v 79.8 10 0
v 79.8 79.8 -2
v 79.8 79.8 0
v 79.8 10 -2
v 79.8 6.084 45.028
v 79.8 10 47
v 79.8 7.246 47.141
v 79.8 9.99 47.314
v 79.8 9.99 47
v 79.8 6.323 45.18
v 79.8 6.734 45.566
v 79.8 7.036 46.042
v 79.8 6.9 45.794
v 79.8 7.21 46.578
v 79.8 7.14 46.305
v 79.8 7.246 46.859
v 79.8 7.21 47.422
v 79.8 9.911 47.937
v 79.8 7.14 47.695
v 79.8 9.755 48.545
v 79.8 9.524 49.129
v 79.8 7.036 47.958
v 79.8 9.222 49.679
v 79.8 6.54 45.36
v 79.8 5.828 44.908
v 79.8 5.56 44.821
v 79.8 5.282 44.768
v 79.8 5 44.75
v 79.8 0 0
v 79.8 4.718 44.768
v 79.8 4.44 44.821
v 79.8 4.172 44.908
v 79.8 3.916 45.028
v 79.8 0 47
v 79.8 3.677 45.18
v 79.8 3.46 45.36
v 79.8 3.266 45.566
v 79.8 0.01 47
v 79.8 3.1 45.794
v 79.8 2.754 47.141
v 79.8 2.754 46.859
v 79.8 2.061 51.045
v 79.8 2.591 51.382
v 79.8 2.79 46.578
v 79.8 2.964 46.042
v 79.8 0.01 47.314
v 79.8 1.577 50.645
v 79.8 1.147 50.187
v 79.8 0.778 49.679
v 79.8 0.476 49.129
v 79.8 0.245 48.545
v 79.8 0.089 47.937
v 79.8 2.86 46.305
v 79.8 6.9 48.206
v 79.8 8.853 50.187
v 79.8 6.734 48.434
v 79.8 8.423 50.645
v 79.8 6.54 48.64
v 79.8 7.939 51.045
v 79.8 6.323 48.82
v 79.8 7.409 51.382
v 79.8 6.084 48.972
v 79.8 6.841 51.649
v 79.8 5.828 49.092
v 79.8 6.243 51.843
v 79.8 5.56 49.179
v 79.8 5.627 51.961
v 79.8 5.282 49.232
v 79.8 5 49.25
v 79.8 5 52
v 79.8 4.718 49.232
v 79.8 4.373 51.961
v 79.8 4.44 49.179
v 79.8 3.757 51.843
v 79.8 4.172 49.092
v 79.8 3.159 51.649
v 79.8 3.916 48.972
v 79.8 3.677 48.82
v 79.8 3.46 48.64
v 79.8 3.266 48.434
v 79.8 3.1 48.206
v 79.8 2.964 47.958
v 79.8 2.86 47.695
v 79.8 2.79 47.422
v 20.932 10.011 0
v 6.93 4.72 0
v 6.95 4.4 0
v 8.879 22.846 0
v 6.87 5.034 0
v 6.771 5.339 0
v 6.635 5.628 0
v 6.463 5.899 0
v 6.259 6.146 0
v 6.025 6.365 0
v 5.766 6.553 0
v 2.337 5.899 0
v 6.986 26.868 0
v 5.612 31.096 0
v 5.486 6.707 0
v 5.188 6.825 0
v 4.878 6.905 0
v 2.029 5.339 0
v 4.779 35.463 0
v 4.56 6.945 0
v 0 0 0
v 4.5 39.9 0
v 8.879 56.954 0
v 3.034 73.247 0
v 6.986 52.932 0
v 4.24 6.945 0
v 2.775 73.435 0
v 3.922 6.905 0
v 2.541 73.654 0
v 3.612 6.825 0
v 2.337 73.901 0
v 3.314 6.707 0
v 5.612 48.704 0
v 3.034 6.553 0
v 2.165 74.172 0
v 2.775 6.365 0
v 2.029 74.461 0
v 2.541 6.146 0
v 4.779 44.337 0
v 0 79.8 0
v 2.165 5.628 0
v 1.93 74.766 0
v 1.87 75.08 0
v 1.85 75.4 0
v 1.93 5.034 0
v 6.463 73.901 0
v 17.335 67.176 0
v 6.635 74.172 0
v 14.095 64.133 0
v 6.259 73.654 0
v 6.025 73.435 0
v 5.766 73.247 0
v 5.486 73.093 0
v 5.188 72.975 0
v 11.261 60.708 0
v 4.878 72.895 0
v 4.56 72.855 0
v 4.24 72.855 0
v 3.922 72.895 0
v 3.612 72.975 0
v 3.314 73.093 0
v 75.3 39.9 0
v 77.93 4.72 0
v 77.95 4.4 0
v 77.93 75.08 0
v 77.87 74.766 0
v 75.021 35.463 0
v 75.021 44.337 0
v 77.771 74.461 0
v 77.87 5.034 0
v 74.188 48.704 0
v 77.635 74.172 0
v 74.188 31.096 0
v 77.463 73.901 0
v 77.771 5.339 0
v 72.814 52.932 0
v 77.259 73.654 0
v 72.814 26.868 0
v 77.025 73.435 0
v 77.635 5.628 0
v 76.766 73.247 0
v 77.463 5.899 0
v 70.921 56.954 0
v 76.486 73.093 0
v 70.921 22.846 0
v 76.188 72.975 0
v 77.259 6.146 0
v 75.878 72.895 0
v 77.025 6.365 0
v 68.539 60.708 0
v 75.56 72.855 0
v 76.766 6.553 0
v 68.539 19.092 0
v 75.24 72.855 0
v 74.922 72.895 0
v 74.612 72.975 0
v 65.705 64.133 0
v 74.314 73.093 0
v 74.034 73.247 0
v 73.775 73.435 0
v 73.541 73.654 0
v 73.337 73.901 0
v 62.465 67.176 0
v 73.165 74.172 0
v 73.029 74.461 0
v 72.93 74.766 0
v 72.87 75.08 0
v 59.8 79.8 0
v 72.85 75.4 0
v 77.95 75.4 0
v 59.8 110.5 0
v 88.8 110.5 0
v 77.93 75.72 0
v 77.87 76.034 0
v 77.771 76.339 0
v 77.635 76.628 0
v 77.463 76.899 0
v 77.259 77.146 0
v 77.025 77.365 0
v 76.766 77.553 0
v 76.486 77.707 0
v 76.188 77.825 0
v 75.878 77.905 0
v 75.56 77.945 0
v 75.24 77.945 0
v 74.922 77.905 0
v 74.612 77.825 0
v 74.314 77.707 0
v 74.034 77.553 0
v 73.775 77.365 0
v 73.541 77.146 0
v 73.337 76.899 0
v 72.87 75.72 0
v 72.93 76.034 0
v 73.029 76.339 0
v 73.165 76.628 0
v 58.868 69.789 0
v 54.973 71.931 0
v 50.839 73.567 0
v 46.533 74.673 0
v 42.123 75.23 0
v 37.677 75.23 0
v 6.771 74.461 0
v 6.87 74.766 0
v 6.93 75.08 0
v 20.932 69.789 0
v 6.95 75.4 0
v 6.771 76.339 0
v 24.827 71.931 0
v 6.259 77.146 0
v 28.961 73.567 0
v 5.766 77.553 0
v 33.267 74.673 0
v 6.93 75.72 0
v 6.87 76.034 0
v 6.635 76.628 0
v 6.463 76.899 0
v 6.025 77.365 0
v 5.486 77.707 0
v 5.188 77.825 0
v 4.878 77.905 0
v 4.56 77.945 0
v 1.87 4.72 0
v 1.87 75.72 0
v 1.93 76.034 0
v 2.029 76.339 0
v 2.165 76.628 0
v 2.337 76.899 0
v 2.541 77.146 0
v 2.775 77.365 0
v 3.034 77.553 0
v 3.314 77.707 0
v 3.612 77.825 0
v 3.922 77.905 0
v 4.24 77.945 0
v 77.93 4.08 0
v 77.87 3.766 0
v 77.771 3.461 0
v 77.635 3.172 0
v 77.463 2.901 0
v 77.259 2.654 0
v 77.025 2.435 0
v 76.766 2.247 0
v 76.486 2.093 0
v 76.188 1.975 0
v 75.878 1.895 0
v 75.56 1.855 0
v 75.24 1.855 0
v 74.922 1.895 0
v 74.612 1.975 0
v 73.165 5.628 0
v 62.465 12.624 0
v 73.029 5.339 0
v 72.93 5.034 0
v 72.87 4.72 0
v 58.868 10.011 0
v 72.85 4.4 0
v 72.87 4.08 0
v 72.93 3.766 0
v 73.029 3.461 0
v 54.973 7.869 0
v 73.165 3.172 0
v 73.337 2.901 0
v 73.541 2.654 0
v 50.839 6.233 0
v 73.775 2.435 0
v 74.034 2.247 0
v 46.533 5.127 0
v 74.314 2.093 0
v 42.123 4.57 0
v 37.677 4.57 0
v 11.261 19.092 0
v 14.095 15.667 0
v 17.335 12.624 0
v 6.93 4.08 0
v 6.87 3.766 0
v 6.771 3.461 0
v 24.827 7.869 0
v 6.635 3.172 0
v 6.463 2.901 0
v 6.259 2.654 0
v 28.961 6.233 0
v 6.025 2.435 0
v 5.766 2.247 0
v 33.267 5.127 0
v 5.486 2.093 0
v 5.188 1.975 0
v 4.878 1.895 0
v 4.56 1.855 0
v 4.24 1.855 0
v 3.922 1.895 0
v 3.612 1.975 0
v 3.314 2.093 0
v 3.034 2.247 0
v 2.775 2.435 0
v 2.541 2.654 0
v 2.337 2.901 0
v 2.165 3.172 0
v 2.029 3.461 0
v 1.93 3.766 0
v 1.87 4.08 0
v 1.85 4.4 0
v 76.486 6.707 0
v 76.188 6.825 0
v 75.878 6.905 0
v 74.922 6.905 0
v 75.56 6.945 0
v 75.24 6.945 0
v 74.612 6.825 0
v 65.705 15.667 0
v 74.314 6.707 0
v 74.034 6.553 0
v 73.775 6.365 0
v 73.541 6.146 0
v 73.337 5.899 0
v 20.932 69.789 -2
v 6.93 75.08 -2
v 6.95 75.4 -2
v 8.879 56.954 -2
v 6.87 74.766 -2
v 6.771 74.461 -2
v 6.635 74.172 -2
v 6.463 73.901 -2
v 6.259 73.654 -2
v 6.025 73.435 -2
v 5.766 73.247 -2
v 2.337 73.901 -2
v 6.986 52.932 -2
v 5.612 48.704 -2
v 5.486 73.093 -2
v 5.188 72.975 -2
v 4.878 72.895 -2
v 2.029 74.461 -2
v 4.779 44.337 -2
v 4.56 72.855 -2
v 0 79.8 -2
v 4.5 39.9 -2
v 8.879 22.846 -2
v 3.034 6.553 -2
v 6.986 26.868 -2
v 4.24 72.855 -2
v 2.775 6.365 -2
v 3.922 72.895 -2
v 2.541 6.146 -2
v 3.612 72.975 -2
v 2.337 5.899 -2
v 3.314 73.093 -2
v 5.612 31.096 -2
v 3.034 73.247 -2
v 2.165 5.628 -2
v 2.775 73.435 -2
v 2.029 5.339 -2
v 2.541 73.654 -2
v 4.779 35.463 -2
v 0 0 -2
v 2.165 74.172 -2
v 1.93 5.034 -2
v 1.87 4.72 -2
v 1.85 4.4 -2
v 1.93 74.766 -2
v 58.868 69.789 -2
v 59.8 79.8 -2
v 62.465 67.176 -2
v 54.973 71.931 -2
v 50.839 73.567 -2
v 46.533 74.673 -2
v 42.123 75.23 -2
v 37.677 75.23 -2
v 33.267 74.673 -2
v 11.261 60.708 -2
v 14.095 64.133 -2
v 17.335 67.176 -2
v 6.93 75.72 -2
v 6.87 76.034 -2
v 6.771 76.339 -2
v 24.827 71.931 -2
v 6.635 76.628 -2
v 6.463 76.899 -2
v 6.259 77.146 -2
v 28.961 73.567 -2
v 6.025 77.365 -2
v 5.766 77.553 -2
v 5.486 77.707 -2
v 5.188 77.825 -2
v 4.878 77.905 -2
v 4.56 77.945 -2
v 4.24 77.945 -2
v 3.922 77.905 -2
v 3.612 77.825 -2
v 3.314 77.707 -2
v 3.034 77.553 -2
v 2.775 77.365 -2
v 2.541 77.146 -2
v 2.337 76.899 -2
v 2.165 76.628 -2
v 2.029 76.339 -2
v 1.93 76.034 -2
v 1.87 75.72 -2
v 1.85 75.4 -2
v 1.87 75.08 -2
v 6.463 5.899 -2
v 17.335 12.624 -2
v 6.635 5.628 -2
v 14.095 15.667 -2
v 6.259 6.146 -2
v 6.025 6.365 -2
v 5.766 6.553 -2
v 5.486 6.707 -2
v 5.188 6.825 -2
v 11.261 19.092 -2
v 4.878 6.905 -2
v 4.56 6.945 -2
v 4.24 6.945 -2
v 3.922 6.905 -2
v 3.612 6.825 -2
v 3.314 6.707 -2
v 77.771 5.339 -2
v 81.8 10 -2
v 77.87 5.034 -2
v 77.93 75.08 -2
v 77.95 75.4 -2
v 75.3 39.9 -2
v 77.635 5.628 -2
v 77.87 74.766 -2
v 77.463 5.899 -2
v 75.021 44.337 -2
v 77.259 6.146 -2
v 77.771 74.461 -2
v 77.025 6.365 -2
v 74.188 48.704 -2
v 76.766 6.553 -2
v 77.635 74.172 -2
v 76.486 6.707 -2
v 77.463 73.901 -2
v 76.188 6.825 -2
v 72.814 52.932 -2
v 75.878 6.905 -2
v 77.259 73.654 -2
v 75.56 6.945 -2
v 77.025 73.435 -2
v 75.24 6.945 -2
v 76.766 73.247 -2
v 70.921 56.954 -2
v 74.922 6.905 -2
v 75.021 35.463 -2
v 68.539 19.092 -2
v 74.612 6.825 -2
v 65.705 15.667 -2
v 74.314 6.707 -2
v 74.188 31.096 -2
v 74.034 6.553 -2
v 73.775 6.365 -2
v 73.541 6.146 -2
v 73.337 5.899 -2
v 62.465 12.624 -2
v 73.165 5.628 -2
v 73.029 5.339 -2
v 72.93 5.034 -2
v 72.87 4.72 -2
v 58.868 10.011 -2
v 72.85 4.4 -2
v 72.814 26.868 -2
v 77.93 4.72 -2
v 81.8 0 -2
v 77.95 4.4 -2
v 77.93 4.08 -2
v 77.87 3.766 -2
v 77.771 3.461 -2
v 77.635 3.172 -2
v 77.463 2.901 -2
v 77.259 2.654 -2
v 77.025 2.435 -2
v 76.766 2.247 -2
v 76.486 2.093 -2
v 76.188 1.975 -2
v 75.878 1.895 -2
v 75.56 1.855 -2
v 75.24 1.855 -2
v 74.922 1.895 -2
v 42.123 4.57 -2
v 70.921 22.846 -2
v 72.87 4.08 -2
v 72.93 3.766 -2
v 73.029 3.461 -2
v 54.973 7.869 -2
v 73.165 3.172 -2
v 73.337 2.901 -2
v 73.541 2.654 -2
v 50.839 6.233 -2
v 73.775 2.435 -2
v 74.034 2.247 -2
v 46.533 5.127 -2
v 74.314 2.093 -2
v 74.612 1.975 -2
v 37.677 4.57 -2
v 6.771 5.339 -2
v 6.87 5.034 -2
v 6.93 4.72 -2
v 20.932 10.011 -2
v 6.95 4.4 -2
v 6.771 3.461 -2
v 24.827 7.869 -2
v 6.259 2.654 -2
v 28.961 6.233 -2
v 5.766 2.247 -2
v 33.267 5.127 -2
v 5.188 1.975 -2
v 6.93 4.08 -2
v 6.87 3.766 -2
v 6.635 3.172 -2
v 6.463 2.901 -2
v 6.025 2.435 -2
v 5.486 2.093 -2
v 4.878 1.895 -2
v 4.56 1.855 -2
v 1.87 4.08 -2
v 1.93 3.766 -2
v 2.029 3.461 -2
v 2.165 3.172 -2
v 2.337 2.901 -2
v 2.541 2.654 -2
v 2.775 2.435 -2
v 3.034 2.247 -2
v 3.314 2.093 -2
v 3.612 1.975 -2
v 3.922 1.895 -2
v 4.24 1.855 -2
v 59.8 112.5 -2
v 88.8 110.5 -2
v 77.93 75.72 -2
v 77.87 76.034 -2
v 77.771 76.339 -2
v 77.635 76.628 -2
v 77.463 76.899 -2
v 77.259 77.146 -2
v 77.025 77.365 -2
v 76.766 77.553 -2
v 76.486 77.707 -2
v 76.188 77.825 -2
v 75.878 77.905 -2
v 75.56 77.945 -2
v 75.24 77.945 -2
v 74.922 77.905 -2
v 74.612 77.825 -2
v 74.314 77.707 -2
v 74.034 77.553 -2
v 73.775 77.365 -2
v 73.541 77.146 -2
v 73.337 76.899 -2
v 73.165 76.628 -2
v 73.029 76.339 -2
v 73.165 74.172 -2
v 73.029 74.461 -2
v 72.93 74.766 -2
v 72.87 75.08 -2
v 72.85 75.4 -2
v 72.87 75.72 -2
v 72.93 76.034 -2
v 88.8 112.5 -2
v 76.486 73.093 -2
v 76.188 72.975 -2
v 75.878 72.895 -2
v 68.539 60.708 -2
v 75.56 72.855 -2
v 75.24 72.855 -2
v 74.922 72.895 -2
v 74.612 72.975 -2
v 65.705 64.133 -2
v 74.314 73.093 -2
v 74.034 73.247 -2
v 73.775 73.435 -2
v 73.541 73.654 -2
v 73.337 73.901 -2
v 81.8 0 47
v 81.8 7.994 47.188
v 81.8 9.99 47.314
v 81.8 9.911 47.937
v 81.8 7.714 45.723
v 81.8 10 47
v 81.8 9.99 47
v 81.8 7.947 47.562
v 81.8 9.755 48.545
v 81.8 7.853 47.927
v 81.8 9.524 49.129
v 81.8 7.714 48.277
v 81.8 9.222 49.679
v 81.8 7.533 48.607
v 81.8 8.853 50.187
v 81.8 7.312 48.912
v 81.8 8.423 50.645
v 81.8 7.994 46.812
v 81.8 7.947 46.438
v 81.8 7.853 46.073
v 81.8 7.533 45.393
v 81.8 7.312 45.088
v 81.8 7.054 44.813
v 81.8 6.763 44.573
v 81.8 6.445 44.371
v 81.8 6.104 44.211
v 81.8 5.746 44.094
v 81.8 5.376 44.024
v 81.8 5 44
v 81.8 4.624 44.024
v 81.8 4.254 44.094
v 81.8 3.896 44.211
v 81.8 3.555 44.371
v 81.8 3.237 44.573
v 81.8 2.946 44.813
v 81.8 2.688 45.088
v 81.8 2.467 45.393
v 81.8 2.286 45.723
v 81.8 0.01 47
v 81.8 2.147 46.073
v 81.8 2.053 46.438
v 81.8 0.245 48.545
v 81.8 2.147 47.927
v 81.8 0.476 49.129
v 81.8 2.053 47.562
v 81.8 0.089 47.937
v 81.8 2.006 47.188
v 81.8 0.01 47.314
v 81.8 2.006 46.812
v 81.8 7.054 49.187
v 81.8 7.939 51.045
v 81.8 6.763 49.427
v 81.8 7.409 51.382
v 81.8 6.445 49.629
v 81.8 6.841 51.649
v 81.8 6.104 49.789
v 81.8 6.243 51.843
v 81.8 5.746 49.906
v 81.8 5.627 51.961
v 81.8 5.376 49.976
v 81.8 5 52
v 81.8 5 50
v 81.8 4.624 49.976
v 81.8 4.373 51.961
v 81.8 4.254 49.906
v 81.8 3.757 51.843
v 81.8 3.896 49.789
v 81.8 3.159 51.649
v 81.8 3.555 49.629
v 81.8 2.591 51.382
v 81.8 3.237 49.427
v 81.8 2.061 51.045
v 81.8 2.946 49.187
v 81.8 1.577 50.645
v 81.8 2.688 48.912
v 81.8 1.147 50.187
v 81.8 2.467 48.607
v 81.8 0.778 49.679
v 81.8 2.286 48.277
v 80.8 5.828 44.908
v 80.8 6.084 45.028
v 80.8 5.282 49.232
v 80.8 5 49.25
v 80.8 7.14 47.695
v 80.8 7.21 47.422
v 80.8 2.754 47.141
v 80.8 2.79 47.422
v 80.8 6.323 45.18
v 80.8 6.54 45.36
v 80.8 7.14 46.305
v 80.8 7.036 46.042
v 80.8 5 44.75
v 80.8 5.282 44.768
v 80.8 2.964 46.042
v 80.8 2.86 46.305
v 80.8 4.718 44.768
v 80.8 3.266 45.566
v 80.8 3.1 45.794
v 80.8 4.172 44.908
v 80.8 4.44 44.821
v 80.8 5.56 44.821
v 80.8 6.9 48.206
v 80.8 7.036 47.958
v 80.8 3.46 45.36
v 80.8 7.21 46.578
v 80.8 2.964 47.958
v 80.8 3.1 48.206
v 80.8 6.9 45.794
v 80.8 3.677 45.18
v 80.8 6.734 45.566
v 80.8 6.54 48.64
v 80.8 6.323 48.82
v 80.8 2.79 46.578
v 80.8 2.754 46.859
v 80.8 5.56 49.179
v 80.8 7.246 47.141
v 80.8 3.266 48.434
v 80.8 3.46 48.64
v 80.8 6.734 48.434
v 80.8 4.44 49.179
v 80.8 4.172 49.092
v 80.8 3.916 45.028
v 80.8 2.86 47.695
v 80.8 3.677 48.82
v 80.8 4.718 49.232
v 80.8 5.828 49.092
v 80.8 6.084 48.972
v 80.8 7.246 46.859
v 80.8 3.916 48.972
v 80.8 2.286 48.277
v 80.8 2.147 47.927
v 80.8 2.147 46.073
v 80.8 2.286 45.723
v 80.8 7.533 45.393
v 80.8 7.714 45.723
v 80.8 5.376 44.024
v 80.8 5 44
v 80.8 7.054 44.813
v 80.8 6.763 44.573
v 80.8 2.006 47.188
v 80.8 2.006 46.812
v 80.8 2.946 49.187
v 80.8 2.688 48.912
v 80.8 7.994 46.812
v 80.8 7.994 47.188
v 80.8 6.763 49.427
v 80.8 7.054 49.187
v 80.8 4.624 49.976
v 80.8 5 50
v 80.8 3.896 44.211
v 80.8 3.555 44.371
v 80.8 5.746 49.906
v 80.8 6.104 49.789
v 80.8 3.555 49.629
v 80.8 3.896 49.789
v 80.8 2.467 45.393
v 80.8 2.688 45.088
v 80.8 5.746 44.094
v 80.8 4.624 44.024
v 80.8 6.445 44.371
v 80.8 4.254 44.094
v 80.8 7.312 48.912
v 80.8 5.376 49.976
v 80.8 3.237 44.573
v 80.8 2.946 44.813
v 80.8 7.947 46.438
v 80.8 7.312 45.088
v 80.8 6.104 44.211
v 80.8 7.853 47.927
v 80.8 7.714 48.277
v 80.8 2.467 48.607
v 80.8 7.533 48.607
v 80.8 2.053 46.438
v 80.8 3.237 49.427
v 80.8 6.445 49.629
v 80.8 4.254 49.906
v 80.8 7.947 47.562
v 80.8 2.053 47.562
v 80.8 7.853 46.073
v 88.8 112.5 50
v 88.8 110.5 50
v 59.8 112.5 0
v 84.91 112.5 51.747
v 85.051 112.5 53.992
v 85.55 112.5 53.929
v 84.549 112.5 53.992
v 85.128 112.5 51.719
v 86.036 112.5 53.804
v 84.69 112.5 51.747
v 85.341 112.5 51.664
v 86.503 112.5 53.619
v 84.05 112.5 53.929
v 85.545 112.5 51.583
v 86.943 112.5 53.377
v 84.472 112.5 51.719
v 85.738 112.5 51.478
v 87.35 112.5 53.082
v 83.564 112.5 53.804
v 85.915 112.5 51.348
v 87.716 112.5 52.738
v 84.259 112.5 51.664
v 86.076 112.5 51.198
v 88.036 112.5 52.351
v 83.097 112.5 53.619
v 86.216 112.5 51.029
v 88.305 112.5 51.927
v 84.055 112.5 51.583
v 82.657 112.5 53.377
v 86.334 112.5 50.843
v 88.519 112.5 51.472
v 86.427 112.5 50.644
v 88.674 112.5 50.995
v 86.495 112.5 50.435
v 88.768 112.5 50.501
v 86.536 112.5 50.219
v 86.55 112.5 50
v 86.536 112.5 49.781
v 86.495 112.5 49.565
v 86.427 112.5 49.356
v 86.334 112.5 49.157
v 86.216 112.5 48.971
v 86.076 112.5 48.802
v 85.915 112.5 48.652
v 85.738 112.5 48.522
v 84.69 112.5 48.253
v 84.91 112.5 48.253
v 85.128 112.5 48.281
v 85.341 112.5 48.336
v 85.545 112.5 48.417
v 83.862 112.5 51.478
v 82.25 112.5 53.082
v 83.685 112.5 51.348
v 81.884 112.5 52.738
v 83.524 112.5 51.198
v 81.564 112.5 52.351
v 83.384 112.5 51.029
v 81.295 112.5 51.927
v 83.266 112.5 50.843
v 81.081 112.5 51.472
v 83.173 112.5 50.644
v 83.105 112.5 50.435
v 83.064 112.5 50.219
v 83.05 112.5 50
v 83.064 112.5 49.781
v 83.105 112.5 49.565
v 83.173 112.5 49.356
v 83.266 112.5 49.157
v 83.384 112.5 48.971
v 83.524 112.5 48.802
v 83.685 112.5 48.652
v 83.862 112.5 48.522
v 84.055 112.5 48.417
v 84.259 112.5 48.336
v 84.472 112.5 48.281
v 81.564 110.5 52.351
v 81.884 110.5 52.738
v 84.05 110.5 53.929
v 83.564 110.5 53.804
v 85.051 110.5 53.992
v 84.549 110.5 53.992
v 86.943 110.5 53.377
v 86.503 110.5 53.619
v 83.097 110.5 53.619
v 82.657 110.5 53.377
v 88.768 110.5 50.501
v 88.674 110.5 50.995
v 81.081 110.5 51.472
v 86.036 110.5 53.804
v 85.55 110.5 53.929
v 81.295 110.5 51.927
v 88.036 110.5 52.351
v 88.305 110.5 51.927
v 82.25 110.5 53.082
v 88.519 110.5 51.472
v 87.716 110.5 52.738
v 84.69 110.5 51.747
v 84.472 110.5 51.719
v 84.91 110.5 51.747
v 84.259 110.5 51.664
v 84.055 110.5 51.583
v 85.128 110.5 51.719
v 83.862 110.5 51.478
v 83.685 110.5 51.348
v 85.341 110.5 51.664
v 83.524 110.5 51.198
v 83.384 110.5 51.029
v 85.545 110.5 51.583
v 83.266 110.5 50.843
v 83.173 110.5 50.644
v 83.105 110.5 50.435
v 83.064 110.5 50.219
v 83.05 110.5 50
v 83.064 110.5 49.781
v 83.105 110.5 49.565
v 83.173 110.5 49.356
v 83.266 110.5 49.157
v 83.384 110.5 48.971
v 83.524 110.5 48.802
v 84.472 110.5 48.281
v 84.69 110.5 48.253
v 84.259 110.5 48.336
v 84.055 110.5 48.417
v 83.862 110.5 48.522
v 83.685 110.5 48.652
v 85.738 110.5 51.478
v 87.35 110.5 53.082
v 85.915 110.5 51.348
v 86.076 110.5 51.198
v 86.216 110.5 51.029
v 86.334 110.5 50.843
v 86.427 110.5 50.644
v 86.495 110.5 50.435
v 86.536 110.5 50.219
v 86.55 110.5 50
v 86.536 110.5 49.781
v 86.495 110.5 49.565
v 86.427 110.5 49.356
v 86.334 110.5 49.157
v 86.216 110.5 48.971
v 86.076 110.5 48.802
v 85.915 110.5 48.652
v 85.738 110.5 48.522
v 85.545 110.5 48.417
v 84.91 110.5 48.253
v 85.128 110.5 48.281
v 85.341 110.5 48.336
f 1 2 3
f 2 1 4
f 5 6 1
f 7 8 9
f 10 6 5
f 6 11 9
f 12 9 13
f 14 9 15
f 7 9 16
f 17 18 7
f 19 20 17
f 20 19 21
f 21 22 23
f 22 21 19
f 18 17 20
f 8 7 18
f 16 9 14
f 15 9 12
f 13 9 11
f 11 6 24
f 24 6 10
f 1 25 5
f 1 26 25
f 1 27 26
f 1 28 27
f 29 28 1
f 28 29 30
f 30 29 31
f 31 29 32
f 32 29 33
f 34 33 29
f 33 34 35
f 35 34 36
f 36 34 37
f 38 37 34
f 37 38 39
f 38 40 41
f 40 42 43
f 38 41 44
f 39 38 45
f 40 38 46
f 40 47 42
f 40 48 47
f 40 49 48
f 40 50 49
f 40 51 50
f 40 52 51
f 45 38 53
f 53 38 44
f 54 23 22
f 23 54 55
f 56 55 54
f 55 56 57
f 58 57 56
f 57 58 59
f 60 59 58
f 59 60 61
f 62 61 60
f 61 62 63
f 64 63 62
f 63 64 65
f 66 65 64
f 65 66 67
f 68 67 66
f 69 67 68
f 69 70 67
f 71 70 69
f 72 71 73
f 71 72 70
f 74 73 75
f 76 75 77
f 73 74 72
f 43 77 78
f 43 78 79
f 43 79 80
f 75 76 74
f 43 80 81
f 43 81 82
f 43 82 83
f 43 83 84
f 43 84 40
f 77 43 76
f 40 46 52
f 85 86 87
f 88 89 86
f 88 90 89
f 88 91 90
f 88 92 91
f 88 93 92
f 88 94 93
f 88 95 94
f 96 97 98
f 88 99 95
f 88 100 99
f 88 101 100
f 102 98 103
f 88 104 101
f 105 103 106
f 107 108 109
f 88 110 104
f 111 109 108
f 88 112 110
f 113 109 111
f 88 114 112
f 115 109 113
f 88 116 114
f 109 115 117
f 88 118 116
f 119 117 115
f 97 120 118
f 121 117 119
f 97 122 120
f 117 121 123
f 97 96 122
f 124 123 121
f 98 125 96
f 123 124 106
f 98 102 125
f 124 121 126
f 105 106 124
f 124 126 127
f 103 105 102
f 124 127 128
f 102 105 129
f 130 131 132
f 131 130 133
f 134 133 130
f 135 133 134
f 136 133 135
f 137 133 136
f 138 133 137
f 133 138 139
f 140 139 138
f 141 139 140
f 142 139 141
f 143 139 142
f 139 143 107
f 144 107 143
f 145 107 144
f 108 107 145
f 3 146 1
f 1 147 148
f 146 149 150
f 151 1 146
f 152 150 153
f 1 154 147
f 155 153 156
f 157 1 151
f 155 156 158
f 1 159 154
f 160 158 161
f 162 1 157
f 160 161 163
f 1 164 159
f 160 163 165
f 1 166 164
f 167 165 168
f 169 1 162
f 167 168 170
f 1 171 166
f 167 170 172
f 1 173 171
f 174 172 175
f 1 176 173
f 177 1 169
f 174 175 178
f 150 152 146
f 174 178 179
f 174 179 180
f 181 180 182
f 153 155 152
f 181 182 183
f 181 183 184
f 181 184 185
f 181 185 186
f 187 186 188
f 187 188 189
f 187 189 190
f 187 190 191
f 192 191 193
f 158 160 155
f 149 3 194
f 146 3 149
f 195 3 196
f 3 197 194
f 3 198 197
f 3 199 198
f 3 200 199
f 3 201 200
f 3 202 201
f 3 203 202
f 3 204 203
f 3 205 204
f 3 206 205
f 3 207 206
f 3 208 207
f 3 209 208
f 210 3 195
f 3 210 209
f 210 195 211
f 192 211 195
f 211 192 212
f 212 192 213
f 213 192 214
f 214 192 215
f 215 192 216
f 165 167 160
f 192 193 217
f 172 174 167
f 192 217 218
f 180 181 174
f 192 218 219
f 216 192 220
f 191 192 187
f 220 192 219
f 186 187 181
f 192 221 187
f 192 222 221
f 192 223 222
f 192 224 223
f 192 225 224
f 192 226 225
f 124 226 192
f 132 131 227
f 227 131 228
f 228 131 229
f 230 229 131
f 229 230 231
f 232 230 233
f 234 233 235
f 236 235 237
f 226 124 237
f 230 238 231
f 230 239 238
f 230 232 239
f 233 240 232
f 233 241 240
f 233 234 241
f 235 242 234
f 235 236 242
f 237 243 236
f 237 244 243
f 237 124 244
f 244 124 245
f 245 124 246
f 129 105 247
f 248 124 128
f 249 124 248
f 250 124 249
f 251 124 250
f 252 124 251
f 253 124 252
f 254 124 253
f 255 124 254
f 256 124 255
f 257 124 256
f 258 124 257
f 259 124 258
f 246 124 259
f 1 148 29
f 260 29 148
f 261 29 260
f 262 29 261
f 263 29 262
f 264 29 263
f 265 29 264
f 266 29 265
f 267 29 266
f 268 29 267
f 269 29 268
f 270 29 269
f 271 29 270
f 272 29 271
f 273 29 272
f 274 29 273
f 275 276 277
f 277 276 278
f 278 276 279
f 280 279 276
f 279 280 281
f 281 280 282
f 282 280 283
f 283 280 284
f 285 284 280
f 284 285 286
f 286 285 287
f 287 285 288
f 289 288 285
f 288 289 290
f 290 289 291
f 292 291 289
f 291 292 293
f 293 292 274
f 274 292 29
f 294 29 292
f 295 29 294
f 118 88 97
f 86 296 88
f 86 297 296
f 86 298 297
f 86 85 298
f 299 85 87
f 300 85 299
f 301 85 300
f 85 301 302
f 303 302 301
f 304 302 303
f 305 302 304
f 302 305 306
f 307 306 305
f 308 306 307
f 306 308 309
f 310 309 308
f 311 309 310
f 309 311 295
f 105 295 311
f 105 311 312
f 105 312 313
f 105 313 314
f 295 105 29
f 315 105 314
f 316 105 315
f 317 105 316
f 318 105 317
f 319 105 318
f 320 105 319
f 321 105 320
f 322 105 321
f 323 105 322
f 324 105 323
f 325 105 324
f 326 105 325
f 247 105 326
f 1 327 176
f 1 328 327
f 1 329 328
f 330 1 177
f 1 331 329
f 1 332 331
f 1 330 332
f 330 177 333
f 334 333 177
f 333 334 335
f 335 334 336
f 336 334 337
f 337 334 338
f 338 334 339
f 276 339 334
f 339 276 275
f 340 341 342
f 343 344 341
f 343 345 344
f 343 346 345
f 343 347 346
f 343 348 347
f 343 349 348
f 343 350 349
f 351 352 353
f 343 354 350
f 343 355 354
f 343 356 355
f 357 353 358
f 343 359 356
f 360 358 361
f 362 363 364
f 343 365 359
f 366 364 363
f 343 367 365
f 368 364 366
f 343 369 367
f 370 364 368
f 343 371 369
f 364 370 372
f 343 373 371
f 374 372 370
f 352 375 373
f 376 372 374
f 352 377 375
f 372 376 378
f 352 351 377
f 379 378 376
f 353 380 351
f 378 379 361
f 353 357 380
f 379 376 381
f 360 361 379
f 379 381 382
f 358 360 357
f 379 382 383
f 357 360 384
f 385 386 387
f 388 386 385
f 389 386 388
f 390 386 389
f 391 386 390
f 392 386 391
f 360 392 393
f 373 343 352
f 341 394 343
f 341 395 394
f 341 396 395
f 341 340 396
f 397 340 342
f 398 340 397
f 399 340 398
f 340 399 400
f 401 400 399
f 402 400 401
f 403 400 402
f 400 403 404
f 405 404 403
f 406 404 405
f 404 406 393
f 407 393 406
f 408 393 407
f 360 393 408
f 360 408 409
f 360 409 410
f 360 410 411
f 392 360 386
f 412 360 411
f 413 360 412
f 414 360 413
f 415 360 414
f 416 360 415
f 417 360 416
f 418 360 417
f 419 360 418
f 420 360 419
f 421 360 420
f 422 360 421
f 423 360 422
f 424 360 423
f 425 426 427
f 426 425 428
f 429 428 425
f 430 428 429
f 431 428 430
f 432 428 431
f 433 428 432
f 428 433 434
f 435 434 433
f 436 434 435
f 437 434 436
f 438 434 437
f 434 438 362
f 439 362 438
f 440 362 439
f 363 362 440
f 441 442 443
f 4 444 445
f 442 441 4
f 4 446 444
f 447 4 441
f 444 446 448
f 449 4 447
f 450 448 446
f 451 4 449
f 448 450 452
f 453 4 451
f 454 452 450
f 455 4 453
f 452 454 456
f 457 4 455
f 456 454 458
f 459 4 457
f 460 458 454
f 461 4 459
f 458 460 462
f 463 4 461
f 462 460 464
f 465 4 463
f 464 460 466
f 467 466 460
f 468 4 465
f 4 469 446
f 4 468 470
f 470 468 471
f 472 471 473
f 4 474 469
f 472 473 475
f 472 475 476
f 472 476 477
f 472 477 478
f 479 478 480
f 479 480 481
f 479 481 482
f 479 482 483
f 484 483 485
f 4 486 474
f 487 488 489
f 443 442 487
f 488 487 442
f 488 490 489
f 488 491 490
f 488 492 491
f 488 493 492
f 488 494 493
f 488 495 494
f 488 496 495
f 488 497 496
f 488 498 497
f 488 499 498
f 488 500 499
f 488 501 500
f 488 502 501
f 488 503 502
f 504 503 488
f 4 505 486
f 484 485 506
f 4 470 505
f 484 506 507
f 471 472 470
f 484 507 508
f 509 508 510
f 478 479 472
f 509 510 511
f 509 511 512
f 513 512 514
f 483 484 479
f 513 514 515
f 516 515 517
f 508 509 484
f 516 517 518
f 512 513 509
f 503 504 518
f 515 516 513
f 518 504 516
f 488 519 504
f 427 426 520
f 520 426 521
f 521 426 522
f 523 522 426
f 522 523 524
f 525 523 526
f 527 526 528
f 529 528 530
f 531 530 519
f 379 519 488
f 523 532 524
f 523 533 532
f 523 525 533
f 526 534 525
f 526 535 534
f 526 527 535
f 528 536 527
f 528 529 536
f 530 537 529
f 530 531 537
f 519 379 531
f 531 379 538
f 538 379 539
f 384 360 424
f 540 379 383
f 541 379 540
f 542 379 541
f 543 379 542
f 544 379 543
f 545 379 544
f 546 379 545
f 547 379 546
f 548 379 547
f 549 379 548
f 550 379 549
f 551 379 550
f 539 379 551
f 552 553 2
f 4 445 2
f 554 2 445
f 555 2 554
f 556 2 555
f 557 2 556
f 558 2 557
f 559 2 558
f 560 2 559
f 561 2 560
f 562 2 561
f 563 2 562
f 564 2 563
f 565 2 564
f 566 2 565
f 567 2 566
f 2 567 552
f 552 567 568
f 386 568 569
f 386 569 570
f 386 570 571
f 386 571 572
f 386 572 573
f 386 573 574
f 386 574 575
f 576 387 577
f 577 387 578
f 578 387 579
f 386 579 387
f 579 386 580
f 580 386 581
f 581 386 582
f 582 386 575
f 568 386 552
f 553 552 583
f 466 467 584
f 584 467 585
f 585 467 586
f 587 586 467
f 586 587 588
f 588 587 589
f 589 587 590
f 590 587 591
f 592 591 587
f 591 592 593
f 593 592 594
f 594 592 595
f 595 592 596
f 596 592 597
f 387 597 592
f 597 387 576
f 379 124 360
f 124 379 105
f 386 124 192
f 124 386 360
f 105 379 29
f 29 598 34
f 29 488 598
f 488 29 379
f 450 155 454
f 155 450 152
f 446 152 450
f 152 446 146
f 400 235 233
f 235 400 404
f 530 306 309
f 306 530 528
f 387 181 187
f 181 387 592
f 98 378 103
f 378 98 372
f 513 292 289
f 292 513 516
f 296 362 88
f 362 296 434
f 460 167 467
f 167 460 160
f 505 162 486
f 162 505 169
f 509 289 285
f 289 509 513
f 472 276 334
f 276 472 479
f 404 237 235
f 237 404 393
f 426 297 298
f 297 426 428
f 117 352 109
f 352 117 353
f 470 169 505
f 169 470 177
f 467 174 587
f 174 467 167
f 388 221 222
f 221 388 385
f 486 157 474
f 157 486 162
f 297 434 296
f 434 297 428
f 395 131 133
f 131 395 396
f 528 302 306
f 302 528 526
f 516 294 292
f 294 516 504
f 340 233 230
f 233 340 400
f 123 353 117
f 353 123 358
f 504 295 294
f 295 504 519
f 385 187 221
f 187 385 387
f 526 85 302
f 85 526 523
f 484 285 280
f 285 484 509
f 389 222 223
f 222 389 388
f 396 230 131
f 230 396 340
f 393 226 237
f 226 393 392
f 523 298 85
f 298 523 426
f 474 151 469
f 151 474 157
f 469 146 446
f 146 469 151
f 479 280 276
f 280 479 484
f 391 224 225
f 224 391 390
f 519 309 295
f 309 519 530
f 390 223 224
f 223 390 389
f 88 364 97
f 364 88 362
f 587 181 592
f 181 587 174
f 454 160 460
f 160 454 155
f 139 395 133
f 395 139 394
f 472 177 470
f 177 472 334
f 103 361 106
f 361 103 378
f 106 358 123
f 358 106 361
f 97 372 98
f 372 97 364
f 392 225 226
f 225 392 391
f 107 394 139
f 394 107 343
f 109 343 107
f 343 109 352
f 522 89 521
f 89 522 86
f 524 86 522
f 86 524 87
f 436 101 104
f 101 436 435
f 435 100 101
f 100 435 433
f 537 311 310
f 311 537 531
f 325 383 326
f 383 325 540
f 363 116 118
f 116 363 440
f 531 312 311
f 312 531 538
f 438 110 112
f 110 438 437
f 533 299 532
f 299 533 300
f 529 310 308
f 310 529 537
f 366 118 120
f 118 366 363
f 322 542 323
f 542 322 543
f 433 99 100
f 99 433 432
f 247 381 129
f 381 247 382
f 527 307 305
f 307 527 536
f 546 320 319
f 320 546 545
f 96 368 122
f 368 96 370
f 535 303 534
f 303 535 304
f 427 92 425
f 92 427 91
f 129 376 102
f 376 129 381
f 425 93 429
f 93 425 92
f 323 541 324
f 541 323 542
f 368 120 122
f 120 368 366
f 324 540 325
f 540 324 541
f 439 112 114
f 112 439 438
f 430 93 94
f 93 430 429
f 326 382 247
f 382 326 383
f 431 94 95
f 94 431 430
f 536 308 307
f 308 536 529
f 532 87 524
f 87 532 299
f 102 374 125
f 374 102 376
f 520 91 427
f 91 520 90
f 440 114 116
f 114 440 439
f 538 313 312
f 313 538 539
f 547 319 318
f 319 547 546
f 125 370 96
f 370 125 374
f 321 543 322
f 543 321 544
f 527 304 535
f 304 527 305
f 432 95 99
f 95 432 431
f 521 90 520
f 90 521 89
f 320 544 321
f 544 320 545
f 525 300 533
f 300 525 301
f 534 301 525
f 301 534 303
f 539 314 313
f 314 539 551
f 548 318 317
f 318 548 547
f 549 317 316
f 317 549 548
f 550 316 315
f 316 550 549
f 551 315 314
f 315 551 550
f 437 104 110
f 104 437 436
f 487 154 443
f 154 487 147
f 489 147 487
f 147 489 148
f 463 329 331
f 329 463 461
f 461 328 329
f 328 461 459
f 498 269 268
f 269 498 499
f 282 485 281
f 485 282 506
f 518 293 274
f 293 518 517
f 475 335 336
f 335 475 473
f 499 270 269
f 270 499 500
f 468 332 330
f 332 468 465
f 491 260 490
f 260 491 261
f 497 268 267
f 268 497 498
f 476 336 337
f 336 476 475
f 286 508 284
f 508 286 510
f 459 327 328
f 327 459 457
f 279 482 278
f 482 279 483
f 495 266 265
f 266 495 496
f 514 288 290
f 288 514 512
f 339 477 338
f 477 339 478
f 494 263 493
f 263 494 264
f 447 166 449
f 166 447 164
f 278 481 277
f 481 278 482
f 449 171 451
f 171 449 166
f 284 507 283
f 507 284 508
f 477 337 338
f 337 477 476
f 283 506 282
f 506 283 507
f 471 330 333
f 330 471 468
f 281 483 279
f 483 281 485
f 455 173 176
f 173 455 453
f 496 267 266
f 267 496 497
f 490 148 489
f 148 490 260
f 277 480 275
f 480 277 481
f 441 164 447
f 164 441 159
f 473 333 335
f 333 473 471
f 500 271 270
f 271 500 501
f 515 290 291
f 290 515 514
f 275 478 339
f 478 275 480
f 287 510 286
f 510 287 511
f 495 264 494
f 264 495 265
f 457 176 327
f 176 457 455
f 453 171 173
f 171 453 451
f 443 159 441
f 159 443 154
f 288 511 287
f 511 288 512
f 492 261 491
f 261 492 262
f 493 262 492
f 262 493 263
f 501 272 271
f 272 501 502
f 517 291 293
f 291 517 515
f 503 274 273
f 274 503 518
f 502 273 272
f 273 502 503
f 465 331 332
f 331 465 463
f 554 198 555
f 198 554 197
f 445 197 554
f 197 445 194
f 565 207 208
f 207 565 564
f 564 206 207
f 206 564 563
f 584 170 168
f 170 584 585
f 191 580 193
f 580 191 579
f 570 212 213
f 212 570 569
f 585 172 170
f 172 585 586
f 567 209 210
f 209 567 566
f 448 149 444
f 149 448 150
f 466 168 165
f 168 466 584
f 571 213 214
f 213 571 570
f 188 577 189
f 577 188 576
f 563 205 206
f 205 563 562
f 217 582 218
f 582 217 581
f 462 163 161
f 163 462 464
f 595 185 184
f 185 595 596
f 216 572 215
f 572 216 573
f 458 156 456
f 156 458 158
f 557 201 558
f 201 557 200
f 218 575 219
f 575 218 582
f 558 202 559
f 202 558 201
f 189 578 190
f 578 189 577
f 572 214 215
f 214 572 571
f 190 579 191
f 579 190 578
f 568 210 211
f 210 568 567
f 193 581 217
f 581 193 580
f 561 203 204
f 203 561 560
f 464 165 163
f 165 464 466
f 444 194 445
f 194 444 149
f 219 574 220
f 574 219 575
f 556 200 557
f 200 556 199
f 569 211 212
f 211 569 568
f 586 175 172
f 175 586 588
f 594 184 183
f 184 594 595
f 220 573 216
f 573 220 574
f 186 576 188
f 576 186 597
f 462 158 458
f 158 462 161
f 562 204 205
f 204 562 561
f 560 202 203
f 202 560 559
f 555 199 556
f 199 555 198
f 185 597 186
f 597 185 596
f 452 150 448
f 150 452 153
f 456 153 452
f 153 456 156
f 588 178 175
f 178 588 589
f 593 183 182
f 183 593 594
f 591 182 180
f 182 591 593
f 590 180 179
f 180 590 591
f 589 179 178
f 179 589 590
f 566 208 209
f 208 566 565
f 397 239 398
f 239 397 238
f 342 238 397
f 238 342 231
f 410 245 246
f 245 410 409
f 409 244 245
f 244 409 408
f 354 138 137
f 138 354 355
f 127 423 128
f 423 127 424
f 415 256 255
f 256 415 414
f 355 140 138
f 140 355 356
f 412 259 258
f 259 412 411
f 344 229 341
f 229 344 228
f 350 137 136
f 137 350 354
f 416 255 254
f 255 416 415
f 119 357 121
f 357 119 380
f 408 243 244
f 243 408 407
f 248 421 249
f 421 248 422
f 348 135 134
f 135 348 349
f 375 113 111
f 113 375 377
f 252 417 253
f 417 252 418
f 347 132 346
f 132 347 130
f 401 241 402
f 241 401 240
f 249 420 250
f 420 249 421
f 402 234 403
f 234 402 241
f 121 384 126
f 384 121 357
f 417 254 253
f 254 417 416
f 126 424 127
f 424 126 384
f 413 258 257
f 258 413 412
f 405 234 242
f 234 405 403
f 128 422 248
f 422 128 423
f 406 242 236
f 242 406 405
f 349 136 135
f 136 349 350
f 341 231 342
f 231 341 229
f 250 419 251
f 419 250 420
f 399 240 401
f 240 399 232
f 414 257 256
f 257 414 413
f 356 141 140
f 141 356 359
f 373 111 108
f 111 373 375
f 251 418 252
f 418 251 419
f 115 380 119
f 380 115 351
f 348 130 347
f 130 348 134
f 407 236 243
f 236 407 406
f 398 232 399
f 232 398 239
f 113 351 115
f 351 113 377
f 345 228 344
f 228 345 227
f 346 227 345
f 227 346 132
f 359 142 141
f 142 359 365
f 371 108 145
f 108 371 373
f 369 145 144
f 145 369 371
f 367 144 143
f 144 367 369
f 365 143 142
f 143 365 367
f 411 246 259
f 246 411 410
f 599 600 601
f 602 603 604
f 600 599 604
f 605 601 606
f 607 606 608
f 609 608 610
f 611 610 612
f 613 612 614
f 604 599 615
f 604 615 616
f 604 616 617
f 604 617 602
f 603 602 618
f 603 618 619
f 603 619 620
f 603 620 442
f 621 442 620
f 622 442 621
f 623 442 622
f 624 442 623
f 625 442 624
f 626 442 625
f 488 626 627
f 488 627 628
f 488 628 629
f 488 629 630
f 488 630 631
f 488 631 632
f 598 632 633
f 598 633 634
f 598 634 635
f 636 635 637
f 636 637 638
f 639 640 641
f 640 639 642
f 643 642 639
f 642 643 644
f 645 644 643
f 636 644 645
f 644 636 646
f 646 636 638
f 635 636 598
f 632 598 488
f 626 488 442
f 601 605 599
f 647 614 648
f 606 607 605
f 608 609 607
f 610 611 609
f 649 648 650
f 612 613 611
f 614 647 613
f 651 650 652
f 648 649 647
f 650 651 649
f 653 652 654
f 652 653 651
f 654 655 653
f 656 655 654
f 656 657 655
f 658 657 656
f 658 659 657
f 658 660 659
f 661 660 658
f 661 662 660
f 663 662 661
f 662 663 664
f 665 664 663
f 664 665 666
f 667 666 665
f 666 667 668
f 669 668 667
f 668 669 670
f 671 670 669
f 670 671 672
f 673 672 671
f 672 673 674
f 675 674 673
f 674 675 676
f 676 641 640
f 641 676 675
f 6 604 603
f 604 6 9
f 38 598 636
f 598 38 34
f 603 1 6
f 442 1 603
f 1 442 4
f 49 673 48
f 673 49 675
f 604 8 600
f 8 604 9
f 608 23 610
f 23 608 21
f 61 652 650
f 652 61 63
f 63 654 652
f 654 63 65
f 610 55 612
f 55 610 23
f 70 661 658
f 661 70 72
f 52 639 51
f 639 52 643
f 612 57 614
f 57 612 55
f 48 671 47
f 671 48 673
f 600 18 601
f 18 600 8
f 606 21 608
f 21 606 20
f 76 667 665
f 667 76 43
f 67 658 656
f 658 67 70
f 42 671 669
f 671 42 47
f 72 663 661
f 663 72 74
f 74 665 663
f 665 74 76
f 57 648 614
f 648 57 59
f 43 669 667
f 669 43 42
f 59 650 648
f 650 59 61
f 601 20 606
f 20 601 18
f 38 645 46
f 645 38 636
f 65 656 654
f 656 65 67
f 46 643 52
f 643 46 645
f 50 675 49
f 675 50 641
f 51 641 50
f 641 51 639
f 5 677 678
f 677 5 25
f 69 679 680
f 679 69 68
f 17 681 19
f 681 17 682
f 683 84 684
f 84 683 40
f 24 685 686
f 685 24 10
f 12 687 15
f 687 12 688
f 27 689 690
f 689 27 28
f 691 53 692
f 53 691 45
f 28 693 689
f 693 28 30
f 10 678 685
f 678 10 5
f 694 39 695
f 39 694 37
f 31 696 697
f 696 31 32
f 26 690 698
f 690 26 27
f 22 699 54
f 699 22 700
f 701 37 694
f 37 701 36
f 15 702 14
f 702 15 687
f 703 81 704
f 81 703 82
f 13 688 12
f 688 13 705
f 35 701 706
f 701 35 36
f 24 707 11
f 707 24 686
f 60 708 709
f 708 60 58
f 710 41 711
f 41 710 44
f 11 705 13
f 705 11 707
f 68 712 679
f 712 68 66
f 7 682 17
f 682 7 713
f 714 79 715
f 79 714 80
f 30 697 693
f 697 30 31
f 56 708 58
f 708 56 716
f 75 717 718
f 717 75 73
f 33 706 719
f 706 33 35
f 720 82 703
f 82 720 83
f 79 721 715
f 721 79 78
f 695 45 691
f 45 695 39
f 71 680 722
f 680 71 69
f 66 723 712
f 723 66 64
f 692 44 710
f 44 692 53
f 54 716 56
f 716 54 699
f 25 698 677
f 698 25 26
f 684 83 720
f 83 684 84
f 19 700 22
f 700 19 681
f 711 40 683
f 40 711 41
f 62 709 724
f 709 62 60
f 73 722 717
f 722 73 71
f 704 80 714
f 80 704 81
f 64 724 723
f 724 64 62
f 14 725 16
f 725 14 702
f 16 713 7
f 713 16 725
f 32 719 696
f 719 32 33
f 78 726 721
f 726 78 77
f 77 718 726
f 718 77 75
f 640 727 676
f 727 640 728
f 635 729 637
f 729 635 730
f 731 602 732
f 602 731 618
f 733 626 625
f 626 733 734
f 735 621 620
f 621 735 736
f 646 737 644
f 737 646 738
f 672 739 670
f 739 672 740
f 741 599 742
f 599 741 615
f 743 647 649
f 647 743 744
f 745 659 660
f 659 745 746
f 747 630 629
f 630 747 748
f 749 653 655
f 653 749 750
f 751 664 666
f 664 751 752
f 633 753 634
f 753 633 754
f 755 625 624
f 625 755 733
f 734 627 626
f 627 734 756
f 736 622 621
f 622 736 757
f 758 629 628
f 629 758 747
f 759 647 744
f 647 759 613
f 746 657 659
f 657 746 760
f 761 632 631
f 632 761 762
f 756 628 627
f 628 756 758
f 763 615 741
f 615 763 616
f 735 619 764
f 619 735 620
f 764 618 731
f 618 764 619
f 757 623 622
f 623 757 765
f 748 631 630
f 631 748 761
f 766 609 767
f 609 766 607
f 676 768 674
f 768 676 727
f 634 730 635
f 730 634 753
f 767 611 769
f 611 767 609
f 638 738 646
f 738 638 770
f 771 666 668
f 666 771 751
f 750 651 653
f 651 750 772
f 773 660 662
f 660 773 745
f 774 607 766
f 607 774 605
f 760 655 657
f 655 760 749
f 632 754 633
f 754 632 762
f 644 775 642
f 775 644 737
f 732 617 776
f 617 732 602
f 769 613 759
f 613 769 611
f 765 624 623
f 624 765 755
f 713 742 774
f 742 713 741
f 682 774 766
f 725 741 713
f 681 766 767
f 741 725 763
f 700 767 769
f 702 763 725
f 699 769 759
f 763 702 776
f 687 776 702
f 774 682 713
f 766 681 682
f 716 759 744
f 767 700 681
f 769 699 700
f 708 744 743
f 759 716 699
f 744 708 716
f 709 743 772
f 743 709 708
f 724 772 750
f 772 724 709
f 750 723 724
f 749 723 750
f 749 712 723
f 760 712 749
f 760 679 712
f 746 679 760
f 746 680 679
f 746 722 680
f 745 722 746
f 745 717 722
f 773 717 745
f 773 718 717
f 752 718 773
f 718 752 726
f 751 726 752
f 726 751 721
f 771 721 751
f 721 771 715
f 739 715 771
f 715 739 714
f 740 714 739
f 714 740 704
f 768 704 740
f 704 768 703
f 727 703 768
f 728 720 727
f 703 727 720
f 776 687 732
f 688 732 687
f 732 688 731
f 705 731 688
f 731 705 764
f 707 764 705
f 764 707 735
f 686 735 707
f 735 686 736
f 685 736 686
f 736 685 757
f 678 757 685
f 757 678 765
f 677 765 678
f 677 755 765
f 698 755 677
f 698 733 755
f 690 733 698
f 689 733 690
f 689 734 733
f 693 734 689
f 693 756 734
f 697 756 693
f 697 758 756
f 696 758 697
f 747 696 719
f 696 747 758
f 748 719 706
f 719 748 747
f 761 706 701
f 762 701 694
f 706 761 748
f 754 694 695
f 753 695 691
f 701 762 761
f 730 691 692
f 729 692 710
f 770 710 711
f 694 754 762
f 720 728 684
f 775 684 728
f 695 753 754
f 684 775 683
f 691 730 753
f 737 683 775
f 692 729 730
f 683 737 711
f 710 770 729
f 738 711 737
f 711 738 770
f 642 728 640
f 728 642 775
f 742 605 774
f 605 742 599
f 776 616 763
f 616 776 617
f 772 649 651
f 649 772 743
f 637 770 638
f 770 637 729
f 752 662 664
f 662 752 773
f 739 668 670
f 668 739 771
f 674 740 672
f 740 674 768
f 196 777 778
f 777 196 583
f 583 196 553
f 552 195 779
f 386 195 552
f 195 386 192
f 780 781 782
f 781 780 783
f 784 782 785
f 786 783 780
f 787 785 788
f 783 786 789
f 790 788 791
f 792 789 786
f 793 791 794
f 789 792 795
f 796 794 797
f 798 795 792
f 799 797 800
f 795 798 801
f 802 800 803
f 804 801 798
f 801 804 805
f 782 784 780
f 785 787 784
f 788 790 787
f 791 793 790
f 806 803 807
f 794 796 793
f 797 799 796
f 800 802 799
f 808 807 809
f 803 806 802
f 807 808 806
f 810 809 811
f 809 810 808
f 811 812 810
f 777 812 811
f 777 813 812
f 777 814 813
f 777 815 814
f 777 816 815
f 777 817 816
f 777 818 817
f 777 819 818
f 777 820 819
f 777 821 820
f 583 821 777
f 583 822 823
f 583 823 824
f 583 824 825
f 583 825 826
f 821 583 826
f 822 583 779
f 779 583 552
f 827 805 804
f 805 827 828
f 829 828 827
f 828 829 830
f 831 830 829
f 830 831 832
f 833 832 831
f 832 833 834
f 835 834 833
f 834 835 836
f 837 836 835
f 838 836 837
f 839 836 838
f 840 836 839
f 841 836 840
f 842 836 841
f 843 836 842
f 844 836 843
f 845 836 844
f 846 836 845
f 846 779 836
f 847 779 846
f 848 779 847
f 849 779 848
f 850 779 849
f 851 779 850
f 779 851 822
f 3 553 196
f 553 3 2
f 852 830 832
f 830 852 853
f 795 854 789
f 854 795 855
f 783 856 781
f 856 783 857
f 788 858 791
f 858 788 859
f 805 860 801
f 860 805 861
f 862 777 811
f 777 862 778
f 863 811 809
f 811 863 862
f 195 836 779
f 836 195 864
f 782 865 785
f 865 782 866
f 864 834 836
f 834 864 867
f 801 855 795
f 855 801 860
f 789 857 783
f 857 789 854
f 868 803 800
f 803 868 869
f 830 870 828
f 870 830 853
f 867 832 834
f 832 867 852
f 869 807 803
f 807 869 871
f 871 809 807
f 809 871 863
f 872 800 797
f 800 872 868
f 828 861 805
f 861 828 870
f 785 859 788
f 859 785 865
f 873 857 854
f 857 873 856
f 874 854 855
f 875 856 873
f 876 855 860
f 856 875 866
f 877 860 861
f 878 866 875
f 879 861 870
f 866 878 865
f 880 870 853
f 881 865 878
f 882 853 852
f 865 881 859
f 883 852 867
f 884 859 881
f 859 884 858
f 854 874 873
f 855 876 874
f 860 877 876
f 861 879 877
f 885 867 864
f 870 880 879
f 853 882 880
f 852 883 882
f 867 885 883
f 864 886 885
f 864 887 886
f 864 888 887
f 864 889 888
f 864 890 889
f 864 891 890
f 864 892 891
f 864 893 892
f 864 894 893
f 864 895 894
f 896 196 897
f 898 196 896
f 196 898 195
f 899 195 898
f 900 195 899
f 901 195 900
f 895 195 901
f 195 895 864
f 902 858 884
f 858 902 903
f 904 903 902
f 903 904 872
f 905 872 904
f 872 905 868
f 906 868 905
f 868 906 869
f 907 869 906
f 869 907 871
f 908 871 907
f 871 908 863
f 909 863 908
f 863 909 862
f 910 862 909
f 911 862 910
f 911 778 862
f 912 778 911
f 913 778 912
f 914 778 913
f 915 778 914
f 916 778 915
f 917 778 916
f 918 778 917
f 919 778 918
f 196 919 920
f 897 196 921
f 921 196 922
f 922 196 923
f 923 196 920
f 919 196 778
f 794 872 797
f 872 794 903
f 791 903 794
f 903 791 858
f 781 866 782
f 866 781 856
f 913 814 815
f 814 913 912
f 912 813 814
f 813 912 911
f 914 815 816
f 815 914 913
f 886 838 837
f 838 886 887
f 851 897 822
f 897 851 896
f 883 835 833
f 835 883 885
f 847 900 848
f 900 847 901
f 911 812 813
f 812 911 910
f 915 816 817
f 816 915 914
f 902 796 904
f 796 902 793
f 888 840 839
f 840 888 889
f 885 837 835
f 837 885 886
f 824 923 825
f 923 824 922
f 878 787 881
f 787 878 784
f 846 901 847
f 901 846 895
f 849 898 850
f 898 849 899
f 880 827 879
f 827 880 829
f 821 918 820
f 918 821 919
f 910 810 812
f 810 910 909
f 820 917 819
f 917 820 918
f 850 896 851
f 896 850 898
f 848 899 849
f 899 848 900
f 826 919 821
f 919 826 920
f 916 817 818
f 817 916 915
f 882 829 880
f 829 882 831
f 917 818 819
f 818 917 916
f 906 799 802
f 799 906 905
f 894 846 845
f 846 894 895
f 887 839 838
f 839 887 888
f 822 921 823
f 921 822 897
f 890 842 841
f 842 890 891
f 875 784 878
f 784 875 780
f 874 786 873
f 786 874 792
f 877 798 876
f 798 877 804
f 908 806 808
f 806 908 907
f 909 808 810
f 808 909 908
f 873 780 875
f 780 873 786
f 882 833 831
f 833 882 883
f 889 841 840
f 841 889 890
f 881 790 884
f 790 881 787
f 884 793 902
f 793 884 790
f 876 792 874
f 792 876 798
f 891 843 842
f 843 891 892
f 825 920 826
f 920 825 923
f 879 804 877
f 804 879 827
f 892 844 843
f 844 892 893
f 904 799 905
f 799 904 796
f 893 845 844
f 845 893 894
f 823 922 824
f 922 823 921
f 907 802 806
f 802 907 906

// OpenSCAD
fan=79.8; // Fan diameter
thickness=25; // Fan thickness

placca(fan, thickness);

module placca (fan,thickness){
    translate([0,0,-2])difference(){
        cube([fan,fan,2]);
        translate([fan/2,fan/2,-.5]) cylinder(r=(fan-9)/2,h=3);
        translate([4.4,4.4,-.5]) cylinder(r=5.1/2,h=3);
        translate([fan-4.4,4.4,-.5]) cylinder(r=5.1/2,h=3);
        translate([fan-4.4,fan-4.4,-.5]) cylinder(r=5.1/2,h=3);
        translate([4.4,fan-4.4,-.5]) cylinder(r=5.1/2,h=3);
    }
    
    difference(){
        union(){
            translate([fan,0,-2]) cube([2,10,2+22+thickness]);
            translate([fan,5,thickness+22]) rotate([0,90,0]) cylinder(r=10/2,h=2);
        }
        translate([fan+1,10/2,thickness+22])rotate([0,90,0])cylinder(r=4.5/2,h=3,center=true);
        translate([fan+1,10/2,thickness+22])rotate([0,90,0])cylinder(r=6/2,h=2);
    }
    
    difference(){
        union(){
            hull(){
                translate([fan-20,fan,-2]) cube([20,110.5-fan,2]);
                translate([fan-20,110.5,-2]) cube([20+9,2,2]);
            }
            hull(){
                translate([fan-20,110.5,-2]) cube([20+9,2,2]);
                translate([fan+5,110.5,thickness+25]) rotate([-90,0,0]) cylinder(r=8/2,h=2);
            }
        }
        translate([fan+5,110,thickness+25]) rotate([-90,0,0]) cylinder(r=3.5/2,h=3);
    }
}

$fn=50;
